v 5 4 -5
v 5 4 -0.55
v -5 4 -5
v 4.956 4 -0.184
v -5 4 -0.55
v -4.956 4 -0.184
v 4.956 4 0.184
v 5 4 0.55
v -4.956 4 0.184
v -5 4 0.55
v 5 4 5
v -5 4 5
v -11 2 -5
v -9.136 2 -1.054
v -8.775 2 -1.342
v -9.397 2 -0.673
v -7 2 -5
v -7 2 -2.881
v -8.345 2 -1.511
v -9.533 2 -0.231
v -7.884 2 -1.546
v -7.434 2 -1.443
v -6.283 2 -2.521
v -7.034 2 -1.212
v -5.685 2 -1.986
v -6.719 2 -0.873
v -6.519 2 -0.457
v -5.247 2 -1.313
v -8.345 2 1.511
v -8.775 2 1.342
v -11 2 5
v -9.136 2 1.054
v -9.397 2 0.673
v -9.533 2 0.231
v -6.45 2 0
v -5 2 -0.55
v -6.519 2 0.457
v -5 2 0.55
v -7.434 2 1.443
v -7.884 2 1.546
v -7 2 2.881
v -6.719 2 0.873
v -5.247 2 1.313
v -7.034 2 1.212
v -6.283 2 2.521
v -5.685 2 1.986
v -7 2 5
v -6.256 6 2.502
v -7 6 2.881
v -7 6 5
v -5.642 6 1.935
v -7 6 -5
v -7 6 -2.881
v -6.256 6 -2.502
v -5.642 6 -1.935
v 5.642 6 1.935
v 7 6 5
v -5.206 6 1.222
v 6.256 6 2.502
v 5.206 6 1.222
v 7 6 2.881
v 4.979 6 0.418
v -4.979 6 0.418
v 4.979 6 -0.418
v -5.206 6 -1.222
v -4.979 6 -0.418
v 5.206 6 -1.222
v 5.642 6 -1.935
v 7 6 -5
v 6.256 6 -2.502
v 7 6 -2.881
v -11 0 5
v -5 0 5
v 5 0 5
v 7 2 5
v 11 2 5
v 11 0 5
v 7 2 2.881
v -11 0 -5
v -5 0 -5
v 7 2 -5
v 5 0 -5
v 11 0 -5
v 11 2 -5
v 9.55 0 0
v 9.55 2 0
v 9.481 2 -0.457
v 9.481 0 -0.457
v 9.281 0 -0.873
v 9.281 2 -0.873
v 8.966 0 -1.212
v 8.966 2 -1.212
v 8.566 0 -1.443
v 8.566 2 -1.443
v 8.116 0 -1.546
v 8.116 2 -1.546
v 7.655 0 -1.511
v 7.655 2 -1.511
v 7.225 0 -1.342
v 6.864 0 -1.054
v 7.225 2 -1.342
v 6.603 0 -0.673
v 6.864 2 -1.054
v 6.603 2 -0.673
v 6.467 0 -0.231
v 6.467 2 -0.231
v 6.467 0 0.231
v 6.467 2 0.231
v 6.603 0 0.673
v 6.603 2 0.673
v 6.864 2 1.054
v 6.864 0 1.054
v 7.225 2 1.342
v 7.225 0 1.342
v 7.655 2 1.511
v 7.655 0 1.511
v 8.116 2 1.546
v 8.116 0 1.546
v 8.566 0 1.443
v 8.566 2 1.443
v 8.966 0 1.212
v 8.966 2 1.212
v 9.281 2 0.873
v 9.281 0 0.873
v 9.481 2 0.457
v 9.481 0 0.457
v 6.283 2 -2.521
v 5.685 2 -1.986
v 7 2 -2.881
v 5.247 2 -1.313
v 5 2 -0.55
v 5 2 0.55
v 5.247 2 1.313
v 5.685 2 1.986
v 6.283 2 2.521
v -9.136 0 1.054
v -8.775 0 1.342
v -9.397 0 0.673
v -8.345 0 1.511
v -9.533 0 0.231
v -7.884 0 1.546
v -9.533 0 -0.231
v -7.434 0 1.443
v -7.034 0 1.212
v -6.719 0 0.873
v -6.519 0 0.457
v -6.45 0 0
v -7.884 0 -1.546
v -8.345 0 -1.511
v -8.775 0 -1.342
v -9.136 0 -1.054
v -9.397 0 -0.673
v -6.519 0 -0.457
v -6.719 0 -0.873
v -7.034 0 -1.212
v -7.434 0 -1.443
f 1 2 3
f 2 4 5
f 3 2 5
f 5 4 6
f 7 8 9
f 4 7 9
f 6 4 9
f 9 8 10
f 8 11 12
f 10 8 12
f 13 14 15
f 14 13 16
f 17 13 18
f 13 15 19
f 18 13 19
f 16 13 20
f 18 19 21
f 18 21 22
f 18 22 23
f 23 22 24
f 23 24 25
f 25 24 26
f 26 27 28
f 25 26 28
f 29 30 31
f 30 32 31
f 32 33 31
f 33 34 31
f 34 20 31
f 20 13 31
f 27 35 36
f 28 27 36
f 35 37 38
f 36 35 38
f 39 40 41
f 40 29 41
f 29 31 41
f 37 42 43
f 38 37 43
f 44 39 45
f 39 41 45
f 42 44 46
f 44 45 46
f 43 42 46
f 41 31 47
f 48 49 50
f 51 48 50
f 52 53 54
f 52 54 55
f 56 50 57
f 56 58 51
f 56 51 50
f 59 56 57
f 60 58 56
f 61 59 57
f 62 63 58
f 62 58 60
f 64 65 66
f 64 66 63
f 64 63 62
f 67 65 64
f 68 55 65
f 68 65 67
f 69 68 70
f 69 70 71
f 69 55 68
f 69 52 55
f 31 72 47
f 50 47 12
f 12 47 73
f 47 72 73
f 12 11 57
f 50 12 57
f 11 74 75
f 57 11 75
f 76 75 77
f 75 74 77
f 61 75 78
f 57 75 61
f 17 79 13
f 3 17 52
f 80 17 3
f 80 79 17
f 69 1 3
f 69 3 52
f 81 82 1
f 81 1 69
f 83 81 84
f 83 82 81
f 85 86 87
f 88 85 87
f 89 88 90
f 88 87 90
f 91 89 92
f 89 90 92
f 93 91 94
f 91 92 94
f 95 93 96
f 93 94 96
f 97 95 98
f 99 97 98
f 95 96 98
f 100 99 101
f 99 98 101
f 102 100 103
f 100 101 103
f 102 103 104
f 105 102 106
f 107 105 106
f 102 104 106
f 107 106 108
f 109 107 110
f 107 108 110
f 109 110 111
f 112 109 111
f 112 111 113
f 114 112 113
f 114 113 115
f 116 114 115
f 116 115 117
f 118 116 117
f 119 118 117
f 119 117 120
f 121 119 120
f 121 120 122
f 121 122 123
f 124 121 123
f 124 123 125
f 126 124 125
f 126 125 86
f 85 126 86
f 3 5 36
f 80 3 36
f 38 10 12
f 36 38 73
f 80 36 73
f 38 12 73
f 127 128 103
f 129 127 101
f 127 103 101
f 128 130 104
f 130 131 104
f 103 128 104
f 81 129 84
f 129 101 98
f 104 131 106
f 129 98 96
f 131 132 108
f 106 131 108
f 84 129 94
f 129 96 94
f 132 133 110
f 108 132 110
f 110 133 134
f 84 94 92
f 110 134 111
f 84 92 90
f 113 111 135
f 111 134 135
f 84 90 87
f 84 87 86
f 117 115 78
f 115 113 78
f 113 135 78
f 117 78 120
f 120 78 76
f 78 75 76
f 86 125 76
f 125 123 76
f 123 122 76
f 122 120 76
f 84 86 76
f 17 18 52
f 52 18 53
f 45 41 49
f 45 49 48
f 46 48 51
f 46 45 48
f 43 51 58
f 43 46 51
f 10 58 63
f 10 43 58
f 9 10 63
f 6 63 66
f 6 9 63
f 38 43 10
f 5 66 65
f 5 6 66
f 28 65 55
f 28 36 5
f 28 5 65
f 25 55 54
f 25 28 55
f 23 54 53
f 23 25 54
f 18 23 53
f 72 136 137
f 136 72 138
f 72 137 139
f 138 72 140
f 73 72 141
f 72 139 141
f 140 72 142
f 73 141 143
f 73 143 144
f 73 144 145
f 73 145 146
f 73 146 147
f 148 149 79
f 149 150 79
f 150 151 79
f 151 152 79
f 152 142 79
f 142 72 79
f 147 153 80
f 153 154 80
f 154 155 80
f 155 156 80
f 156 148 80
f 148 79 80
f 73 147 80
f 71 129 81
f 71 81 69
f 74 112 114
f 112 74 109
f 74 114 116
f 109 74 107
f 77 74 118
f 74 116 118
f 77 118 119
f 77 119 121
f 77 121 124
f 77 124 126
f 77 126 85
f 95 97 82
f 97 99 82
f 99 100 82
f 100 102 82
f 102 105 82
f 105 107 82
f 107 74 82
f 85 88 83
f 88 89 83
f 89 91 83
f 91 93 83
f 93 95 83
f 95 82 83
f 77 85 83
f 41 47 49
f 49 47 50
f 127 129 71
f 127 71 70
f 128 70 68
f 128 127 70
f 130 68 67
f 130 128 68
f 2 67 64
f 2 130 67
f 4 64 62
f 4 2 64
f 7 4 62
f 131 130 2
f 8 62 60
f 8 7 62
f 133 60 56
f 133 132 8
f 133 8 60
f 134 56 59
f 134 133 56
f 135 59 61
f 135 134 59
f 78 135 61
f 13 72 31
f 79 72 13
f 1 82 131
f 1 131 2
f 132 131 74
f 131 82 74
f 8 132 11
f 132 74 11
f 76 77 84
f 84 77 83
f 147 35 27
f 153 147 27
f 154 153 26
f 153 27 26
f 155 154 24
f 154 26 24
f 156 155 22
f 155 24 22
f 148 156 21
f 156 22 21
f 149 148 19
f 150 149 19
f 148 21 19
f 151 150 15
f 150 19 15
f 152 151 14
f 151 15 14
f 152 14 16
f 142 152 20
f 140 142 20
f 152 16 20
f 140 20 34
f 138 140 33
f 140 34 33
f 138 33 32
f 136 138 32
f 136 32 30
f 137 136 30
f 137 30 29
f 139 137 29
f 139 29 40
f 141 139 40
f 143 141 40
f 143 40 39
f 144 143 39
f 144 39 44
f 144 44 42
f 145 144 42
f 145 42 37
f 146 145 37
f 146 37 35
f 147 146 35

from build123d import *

# Parameters (mm, degrees)
SKETCH_1_W          = 22
SKETCH_1_H          = 10
EXTRUDE_1_DEPTH     = 6
SKETCH_2_W          = 10
SKETCH_2_H          = 4
SKETCH_2_W_2        = 4
CUT_EXTRUDE_1_DEPTH = 24
SKETCH_3_R          = 1.55
CUT_EXTRUDE_2_DEPTH = 6
SKETCH_3_3_R        = 3.05
CUT_EXTRUDE_3_DEPTH = 6


with BuildPart() as part:
    # 草图1 → 凸台-拉伸1 (new body)
    with BuildSketch(Plane(origin=(0, 0, 0), x_dir=(1, 0, 0), z_dir=(0, 1, 0))):
        Rectangle(SKETCH_1_W, SKETCH_1_H)
    extrude(amount=EXTRUDE_1_DEPTH)

    # 草图2 → 切除-拉伸1 (cut)
    with BuildSketch(Plane.XY.offset(5)):
        with Locations((0, 2)):
            Rectangle(SKETCH_2_W, SKETCH_2_H)
        with Locations((-9, 4)):
            Rectangle(SKETCH_2_W_2, SKETCH_2_H)
        with Locations((9, 4)):
            Rectangle(SKETCH_2_W_2, SKETCH_2_H)
    extrude(amount=-CUT_EXTRUDE_1_DEPTH, mode=Mode.SUBTRACT)

    # 草图3 → 切除-拉伸2 (cut)
    with BuildSketch(Plane(origin=(0, 2, 0), x_dir=(1, 0, 0), z_dir=(0, 1, 0))):
        with Locations((-8, 0)):
            Circle(SKETCH_3_R)
        with Locations((8, 0)):
            Circle(SKETCH_3_R)
    extrude(amount=-CUT_EXTRUDE_2_DEPTH, mode=Mode.SUBTRACT)

    # 草图3<3> → 切除-拉伸3 (cut)
    with BuildSketch(Plane(origin=(0, 2, 0), x_dir=(1, 0, 0), z_dir=(0, 1, 0))):
        with Locations((-8, 0)):
            Circle(SKETCH_3_3_R)
        with Locations((8, 0)):
            Circle(SKETCH_3_3_R)
    extrude(amount=CUT_EXTRUDE_3_DEPTH, mode=Mode.SUBTRACT)


solid = part.part
